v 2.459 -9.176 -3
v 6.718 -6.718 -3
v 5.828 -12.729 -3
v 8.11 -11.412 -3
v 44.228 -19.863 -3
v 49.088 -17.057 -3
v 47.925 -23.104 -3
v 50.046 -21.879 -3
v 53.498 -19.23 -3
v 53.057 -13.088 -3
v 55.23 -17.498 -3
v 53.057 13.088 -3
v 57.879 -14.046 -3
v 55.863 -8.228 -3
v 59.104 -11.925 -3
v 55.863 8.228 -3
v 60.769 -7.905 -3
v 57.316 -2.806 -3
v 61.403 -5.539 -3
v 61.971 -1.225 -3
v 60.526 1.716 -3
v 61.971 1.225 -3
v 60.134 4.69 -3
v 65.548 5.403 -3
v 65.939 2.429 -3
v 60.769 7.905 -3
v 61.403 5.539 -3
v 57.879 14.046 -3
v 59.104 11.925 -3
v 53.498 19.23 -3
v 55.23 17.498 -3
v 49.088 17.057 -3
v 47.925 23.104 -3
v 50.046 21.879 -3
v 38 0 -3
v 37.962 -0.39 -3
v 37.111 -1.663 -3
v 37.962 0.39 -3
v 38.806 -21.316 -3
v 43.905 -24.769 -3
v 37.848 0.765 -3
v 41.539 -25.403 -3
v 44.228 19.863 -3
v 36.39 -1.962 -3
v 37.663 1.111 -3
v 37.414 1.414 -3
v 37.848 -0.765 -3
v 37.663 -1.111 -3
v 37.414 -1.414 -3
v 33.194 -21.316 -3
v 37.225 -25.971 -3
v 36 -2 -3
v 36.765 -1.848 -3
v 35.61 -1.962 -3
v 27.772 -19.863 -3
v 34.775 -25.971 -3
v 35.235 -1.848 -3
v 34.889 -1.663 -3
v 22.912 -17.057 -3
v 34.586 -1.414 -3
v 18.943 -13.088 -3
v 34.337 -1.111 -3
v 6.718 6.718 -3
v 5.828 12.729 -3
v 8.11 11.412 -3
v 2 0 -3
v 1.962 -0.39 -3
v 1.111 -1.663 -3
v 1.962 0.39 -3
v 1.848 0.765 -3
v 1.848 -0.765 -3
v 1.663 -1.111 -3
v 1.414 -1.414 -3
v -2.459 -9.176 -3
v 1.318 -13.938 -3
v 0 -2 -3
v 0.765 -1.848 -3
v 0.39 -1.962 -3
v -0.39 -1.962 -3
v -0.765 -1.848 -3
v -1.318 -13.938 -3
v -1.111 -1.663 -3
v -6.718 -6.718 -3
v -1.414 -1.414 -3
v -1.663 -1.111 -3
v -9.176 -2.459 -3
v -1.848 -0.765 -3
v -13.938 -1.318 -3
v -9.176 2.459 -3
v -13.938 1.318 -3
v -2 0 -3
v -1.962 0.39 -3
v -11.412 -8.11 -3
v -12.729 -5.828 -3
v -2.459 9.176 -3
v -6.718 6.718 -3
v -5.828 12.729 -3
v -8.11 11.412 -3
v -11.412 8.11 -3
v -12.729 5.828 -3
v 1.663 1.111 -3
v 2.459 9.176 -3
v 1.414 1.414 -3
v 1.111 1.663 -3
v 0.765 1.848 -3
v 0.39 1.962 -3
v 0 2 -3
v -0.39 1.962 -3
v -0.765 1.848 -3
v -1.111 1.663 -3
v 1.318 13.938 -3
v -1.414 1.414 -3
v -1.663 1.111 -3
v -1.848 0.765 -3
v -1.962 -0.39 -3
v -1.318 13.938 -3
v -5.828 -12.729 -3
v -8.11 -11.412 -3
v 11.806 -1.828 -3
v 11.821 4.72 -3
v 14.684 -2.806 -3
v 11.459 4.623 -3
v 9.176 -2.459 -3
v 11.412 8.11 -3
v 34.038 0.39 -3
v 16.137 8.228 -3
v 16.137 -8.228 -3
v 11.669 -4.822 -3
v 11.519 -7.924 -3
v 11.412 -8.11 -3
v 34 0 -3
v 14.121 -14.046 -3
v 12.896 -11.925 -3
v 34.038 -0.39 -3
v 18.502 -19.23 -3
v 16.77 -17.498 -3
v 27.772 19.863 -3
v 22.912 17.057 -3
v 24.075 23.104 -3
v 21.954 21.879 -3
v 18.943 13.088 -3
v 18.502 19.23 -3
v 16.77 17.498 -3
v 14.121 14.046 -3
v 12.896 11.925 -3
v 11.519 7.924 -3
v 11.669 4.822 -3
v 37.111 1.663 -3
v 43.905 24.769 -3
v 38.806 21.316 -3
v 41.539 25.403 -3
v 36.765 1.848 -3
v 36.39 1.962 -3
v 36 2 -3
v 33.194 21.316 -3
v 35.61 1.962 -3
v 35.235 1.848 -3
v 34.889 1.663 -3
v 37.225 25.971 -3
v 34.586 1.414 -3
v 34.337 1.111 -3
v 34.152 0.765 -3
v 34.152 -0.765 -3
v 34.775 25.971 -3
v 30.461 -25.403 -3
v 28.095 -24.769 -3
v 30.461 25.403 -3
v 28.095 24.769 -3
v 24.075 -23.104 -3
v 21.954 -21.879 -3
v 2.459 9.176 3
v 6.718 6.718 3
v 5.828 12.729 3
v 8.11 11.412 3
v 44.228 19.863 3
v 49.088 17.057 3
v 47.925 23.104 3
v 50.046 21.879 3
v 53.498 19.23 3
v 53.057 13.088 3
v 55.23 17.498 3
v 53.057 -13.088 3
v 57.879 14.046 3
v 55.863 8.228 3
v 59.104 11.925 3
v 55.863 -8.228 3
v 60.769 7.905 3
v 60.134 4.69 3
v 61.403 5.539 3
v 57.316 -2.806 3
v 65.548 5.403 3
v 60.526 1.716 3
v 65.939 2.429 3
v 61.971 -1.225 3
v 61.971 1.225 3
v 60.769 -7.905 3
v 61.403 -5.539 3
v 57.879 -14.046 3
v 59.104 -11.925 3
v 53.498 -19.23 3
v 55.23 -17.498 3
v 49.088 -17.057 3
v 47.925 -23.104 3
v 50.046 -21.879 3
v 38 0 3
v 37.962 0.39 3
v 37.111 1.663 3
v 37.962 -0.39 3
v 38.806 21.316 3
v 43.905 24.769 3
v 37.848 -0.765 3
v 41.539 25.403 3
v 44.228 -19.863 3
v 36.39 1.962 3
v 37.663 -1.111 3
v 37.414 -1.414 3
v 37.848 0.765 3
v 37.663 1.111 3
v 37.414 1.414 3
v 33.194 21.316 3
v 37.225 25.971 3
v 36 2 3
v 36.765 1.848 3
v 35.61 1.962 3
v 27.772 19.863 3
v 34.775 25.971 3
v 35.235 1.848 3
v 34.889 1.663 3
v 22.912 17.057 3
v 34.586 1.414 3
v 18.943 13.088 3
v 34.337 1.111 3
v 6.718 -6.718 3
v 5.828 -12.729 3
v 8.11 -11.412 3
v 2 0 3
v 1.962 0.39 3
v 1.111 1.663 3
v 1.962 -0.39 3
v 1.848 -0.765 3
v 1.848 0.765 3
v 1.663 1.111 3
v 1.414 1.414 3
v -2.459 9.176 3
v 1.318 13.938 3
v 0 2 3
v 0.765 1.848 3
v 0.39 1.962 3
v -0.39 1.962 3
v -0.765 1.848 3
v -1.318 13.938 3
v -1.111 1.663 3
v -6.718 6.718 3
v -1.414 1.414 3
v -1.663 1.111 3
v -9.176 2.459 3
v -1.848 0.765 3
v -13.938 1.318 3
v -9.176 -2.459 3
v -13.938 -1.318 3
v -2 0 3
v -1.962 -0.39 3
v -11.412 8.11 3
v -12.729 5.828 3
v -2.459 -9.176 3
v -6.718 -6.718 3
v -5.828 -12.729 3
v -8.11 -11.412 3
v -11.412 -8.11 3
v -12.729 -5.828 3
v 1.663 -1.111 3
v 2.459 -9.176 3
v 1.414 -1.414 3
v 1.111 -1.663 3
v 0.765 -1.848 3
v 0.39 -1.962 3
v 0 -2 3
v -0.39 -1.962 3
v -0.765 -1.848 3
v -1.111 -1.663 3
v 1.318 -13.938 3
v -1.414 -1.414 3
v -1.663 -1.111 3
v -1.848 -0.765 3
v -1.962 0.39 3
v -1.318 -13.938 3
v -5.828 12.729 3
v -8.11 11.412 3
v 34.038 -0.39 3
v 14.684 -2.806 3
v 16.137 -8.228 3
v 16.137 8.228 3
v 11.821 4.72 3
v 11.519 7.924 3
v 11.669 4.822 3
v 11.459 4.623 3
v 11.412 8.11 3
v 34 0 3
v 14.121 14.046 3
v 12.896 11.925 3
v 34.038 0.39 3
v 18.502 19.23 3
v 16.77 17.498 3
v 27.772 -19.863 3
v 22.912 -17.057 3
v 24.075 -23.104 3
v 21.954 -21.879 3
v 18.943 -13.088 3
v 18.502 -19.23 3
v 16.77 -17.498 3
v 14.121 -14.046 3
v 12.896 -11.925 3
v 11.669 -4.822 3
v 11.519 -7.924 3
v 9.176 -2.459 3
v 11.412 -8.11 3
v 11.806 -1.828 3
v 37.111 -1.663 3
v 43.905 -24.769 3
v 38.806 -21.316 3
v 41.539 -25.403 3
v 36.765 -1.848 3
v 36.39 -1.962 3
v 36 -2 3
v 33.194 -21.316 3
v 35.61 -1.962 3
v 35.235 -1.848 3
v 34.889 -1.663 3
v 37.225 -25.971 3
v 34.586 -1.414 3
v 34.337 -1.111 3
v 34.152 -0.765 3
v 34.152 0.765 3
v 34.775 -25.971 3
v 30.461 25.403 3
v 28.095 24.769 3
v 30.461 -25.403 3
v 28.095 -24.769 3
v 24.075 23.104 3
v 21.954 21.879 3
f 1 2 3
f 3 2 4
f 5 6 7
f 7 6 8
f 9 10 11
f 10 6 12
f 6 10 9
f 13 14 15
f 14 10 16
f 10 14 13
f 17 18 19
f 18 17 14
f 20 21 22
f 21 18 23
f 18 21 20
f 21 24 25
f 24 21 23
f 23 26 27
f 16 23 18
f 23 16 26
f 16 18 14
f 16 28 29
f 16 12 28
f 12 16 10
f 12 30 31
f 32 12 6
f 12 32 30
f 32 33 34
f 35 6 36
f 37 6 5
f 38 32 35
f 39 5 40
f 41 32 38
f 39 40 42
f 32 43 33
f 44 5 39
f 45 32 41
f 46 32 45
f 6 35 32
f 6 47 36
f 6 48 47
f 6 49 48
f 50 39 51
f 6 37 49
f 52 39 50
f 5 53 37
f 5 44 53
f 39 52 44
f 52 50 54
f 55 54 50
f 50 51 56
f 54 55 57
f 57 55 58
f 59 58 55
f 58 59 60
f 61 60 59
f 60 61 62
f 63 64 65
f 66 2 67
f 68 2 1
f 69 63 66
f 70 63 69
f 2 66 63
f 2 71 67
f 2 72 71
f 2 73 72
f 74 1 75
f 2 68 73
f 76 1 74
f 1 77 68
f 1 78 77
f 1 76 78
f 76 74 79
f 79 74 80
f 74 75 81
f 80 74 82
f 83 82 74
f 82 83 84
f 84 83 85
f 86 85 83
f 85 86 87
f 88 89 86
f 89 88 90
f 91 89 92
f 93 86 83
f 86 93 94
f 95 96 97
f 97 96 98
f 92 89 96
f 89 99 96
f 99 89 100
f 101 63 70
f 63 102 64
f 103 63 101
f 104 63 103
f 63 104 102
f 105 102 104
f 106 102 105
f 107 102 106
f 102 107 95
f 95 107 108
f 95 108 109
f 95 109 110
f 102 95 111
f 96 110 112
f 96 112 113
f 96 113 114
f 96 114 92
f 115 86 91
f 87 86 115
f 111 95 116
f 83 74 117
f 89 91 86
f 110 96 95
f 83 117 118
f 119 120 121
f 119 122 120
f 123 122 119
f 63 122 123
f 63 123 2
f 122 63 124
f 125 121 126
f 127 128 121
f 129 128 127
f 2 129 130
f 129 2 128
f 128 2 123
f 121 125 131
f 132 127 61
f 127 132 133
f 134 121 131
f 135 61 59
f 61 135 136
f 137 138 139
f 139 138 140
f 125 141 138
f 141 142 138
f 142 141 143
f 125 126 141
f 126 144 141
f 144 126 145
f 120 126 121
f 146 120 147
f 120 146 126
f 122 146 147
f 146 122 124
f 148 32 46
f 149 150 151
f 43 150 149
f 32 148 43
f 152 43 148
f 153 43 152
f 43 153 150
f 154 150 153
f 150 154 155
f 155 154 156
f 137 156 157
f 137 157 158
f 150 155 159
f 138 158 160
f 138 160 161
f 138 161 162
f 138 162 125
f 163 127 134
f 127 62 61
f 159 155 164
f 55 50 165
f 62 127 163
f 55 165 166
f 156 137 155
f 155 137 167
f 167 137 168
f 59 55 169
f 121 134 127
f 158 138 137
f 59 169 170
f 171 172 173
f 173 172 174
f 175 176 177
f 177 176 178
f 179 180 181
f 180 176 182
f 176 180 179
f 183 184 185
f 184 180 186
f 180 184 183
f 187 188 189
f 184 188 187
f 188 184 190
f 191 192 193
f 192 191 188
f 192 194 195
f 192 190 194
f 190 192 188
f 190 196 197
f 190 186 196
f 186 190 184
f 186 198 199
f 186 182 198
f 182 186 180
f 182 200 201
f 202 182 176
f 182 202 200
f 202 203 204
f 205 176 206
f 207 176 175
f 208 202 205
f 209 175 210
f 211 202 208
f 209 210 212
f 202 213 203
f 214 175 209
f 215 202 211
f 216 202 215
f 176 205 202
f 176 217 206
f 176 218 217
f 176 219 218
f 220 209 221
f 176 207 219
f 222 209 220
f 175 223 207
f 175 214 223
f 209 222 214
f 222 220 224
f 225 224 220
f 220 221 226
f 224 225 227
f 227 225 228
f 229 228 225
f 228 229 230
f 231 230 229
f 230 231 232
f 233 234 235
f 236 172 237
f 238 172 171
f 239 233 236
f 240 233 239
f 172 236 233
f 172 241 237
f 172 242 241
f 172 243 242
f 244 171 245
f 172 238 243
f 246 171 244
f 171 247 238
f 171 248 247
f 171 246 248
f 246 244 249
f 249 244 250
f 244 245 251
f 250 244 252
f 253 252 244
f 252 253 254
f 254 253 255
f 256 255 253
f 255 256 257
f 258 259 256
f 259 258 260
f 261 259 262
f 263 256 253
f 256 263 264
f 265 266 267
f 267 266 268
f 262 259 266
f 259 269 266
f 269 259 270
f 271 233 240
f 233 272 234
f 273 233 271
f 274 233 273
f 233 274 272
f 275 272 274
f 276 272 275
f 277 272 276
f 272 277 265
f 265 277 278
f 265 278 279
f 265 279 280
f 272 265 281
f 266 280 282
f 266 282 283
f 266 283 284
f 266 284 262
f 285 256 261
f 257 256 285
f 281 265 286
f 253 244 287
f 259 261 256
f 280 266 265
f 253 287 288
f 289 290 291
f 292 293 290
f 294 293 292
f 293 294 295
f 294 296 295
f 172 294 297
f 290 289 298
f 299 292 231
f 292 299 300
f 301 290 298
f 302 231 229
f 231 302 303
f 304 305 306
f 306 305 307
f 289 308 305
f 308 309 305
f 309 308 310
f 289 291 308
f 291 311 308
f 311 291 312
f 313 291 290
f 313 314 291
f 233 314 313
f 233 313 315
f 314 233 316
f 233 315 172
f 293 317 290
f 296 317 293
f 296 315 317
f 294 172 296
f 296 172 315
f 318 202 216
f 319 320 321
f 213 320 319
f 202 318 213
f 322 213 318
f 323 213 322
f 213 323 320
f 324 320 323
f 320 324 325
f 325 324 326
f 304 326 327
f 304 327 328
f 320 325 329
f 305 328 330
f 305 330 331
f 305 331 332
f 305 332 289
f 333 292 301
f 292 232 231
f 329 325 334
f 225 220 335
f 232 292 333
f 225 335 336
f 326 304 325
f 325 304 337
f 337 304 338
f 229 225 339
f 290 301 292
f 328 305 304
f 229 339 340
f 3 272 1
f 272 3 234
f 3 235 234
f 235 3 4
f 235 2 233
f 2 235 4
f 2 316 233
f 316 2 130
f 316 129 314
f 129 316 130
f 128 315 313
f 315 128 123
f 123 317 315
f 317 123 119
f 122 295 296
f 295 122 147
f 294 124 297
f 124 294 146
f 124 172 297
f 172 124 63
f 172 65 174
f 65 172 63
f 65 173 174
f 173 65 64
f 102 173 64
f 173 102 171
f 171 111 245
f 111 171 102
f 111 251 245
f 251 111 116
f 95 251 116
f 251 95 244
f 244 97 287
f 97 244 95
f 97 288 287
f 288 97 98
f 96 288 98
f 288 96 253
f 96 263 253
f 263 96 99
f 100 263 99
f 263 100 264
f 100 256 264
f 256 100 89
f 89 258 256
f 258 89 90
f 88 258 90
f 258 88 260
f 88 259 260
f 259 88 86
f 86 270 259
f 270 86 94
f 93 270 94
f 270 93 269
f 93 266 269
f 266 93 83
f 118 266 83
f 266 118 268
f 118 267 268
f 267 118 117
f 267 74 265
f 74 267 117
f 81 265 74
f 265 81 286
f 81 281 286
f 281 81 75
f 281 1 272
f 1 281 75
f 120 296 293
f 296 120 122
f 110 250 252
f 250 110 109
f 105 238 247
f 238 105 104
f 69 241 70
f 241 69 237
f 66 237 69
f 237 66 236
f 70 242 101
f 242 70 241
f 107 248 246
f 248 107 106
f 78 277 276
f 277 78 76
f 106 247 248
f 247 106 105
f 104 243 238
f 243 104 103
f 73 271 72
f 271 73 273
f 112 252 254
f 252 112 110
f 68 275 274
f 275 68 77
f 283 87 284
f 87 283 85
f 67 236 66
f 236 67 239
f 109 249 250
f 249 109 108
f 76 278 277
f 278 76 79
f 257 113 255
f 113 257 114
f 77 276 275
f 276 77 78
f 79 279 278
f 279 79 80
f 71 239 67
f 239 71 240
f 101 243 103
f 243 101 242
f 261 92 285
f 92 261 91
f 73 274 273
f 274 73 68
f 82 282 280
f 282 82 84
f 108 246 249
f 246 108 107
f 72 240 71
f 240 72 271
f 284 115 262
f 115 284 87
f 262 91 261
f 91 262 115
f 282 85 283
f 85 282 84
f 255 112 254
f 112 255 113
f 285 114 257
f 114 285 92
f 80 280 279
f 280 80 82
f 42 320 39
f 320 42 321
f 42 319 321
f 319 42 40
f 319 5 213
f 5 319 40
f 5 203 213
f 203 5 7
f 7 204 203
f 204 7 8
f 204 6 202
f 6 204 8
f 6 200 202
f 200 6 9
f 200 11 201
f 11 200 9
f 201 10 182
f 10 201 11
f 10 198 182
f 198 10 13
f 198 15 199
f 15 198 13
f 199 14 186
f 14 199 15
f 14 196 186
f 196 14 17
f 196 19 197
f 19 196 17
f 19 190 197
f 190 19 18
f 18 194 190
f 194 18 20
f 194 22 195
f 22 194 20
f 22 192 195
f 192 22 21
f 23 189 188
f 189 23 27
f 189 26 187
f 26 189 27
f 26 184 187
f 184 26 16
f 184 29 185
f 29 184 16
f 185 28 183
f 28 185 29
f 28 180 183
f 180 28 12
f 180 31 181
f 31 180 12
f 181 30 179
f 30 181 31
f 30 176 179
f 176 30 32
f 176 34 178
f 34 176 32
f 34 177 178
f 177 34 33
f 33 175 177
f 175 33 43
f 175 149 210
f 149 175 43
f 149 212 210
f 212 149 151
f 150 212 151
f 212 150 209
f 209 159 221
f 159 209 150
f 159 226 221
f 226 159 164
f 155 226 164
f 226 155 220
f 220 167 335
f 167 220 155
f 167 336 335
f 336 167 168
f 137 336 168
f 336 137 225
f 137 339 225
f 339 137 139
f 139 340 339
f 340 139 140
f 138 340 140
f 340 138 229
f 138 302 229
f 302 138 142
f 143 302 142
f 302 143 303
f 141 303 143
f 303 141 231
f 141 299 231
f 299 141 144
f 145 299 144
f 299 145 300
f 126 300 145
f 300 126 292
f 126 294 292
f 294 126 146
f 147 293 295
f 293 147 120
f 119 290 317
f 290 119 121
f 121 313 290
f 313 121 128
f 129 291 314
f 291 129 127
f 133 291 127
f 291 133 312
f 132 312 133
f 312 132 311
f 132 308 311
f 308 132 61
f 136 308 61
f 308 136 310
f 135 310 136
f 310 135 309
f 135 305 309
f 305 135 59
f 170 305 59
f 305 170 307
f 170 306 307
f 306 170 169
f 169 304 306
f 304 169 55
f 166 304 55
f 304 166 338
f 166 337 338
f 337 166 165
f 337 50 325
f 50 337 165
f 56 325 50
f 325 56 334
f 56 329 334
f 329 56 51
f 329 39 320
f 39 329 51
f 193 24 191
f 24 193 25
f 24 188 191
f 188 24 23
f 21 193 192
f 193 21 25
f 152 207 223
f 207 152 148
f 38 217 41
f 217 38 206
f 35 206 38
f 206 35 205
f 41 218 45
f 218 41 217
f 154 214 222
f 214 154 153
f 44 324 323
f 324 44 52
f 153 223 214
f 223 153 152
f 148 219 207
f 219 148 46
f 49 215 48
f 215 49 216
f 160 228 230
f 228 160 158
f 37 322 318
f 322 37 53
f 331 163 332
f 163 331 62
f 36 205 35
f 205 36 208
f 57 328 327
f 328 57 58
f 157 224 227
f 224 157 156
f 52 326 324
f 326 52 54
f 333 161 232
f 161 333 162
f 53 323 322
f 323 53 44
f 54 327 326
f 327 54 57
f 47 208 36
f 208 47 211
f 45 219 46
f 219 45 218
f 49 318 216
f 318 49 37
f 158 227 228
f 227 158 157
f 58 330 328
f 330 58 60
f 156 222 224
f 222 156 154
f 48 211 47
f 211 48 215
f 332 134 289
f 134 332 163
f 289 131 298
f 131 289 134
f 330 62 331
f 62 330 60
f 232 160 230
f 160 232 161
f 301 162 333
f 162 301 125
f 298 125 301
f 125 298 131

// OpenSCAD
// Original external spur-gear pair fixture, millimetres.
// Two gears with a radial index tab; the tab is a measurement feature, not a
// claim about tooth contact, backlash, strength or manufacturing tolerance.
agentscad_part = "all";
agentscad_pose = false;
input_deg = 0;
ratio_sign = -1;

module_mm = 2;
pinion_teeth = 12;
wheel_teeth = 24;
thickness = 6;
center_distance = module_mm * (pinion_teeth + wheel_teeth) / 2;
pinion_pitch = module_mm * pinion_teeth / 2;
wheel_pitch = module_mm * wheel_teeth / 2;
addendum = module_mm;
dedendum = 1.25 * module_mm;
marker_min_r_mm = 0;
marker_max_r_mm = 0;

wheel_angle_deg = ratio_sign * input_deg * pinion_teeth / wheel_teeth;

module gear_outline(teeth, pitch_radius) {
  tip_radius = pitch_radius + addendum;
  root_radius = pitch_radius - dedendum;
  half_pitch_deg = 180 / teeth;
  tip_half_deg = 0.18 * 360 / teeth;
  points = [
    for (i = [0 : teeth - 1], k = [0 : 2])
      let (a = i * 360 / teeth + (k == 0 ? -half_pitch_deg : (k == 1 ? -tip_half_deg : tip_half_deg)),
           r = k == 0 ? root_radius : tip_radius)
      [r * cos(a), r * sin(a)]
  ];
  linear_extrude(height = thickness, center = true, convexity = 10)
    polygon(points = points);
}

module gear_body(teeth, pitch_radius) {
  root_r = pitch_radius - dedendum;
  tip_r = pitch_radius + addendum;
  // Radial index tab in a root gap (half a tooth pitch from the first tooth).
  // Its outer vertices are the only measurement feature outside the addendum.
  marker_angle = 180 / teeth;
  marker_outer_r = tip_r + 4;
  marker_inner_r = root_r - 0.5;
  difference() {
    union() {
      gear_outline(teeth, pitch_radius);
      rotate([0, 0, marker_angle])
        translate([(marker_inner_r + marker_outer_r) / 2, 0, 0])
          cube([marker_outer_r - marker_inner_r, 3, thickness], center = true);
    }
    cylinder(h = thickness + 2, r = 2, center = true, $fn = 32);
  }
}

module pinion_local() { gear_body(pinion_teeth, pinion_pitch); }
module wheel_local() { gear_body(wheel_teeth, wheel_pitch); }

module generated_part() {
  if (agentscad_part == "pinion") {
    pinion_local();
  } else if (agentscad_part == "wheel") {
    wheel_local();
  } else if (agentscad_part == "pinion_pose") {
    pinion_local();
  } else if (agentscad_part == "wheel_pose") {
    translate([center_distance, 0, 0])
      rotate([0, 0, wheel_angle_deg]) wheel_local();
  } else {
    pinion_local();
    translate([center_distance, 0, 0])
      rotate([0, 0, wheel_angle_deg]) wheel_local();
  }
}

generated_part();
